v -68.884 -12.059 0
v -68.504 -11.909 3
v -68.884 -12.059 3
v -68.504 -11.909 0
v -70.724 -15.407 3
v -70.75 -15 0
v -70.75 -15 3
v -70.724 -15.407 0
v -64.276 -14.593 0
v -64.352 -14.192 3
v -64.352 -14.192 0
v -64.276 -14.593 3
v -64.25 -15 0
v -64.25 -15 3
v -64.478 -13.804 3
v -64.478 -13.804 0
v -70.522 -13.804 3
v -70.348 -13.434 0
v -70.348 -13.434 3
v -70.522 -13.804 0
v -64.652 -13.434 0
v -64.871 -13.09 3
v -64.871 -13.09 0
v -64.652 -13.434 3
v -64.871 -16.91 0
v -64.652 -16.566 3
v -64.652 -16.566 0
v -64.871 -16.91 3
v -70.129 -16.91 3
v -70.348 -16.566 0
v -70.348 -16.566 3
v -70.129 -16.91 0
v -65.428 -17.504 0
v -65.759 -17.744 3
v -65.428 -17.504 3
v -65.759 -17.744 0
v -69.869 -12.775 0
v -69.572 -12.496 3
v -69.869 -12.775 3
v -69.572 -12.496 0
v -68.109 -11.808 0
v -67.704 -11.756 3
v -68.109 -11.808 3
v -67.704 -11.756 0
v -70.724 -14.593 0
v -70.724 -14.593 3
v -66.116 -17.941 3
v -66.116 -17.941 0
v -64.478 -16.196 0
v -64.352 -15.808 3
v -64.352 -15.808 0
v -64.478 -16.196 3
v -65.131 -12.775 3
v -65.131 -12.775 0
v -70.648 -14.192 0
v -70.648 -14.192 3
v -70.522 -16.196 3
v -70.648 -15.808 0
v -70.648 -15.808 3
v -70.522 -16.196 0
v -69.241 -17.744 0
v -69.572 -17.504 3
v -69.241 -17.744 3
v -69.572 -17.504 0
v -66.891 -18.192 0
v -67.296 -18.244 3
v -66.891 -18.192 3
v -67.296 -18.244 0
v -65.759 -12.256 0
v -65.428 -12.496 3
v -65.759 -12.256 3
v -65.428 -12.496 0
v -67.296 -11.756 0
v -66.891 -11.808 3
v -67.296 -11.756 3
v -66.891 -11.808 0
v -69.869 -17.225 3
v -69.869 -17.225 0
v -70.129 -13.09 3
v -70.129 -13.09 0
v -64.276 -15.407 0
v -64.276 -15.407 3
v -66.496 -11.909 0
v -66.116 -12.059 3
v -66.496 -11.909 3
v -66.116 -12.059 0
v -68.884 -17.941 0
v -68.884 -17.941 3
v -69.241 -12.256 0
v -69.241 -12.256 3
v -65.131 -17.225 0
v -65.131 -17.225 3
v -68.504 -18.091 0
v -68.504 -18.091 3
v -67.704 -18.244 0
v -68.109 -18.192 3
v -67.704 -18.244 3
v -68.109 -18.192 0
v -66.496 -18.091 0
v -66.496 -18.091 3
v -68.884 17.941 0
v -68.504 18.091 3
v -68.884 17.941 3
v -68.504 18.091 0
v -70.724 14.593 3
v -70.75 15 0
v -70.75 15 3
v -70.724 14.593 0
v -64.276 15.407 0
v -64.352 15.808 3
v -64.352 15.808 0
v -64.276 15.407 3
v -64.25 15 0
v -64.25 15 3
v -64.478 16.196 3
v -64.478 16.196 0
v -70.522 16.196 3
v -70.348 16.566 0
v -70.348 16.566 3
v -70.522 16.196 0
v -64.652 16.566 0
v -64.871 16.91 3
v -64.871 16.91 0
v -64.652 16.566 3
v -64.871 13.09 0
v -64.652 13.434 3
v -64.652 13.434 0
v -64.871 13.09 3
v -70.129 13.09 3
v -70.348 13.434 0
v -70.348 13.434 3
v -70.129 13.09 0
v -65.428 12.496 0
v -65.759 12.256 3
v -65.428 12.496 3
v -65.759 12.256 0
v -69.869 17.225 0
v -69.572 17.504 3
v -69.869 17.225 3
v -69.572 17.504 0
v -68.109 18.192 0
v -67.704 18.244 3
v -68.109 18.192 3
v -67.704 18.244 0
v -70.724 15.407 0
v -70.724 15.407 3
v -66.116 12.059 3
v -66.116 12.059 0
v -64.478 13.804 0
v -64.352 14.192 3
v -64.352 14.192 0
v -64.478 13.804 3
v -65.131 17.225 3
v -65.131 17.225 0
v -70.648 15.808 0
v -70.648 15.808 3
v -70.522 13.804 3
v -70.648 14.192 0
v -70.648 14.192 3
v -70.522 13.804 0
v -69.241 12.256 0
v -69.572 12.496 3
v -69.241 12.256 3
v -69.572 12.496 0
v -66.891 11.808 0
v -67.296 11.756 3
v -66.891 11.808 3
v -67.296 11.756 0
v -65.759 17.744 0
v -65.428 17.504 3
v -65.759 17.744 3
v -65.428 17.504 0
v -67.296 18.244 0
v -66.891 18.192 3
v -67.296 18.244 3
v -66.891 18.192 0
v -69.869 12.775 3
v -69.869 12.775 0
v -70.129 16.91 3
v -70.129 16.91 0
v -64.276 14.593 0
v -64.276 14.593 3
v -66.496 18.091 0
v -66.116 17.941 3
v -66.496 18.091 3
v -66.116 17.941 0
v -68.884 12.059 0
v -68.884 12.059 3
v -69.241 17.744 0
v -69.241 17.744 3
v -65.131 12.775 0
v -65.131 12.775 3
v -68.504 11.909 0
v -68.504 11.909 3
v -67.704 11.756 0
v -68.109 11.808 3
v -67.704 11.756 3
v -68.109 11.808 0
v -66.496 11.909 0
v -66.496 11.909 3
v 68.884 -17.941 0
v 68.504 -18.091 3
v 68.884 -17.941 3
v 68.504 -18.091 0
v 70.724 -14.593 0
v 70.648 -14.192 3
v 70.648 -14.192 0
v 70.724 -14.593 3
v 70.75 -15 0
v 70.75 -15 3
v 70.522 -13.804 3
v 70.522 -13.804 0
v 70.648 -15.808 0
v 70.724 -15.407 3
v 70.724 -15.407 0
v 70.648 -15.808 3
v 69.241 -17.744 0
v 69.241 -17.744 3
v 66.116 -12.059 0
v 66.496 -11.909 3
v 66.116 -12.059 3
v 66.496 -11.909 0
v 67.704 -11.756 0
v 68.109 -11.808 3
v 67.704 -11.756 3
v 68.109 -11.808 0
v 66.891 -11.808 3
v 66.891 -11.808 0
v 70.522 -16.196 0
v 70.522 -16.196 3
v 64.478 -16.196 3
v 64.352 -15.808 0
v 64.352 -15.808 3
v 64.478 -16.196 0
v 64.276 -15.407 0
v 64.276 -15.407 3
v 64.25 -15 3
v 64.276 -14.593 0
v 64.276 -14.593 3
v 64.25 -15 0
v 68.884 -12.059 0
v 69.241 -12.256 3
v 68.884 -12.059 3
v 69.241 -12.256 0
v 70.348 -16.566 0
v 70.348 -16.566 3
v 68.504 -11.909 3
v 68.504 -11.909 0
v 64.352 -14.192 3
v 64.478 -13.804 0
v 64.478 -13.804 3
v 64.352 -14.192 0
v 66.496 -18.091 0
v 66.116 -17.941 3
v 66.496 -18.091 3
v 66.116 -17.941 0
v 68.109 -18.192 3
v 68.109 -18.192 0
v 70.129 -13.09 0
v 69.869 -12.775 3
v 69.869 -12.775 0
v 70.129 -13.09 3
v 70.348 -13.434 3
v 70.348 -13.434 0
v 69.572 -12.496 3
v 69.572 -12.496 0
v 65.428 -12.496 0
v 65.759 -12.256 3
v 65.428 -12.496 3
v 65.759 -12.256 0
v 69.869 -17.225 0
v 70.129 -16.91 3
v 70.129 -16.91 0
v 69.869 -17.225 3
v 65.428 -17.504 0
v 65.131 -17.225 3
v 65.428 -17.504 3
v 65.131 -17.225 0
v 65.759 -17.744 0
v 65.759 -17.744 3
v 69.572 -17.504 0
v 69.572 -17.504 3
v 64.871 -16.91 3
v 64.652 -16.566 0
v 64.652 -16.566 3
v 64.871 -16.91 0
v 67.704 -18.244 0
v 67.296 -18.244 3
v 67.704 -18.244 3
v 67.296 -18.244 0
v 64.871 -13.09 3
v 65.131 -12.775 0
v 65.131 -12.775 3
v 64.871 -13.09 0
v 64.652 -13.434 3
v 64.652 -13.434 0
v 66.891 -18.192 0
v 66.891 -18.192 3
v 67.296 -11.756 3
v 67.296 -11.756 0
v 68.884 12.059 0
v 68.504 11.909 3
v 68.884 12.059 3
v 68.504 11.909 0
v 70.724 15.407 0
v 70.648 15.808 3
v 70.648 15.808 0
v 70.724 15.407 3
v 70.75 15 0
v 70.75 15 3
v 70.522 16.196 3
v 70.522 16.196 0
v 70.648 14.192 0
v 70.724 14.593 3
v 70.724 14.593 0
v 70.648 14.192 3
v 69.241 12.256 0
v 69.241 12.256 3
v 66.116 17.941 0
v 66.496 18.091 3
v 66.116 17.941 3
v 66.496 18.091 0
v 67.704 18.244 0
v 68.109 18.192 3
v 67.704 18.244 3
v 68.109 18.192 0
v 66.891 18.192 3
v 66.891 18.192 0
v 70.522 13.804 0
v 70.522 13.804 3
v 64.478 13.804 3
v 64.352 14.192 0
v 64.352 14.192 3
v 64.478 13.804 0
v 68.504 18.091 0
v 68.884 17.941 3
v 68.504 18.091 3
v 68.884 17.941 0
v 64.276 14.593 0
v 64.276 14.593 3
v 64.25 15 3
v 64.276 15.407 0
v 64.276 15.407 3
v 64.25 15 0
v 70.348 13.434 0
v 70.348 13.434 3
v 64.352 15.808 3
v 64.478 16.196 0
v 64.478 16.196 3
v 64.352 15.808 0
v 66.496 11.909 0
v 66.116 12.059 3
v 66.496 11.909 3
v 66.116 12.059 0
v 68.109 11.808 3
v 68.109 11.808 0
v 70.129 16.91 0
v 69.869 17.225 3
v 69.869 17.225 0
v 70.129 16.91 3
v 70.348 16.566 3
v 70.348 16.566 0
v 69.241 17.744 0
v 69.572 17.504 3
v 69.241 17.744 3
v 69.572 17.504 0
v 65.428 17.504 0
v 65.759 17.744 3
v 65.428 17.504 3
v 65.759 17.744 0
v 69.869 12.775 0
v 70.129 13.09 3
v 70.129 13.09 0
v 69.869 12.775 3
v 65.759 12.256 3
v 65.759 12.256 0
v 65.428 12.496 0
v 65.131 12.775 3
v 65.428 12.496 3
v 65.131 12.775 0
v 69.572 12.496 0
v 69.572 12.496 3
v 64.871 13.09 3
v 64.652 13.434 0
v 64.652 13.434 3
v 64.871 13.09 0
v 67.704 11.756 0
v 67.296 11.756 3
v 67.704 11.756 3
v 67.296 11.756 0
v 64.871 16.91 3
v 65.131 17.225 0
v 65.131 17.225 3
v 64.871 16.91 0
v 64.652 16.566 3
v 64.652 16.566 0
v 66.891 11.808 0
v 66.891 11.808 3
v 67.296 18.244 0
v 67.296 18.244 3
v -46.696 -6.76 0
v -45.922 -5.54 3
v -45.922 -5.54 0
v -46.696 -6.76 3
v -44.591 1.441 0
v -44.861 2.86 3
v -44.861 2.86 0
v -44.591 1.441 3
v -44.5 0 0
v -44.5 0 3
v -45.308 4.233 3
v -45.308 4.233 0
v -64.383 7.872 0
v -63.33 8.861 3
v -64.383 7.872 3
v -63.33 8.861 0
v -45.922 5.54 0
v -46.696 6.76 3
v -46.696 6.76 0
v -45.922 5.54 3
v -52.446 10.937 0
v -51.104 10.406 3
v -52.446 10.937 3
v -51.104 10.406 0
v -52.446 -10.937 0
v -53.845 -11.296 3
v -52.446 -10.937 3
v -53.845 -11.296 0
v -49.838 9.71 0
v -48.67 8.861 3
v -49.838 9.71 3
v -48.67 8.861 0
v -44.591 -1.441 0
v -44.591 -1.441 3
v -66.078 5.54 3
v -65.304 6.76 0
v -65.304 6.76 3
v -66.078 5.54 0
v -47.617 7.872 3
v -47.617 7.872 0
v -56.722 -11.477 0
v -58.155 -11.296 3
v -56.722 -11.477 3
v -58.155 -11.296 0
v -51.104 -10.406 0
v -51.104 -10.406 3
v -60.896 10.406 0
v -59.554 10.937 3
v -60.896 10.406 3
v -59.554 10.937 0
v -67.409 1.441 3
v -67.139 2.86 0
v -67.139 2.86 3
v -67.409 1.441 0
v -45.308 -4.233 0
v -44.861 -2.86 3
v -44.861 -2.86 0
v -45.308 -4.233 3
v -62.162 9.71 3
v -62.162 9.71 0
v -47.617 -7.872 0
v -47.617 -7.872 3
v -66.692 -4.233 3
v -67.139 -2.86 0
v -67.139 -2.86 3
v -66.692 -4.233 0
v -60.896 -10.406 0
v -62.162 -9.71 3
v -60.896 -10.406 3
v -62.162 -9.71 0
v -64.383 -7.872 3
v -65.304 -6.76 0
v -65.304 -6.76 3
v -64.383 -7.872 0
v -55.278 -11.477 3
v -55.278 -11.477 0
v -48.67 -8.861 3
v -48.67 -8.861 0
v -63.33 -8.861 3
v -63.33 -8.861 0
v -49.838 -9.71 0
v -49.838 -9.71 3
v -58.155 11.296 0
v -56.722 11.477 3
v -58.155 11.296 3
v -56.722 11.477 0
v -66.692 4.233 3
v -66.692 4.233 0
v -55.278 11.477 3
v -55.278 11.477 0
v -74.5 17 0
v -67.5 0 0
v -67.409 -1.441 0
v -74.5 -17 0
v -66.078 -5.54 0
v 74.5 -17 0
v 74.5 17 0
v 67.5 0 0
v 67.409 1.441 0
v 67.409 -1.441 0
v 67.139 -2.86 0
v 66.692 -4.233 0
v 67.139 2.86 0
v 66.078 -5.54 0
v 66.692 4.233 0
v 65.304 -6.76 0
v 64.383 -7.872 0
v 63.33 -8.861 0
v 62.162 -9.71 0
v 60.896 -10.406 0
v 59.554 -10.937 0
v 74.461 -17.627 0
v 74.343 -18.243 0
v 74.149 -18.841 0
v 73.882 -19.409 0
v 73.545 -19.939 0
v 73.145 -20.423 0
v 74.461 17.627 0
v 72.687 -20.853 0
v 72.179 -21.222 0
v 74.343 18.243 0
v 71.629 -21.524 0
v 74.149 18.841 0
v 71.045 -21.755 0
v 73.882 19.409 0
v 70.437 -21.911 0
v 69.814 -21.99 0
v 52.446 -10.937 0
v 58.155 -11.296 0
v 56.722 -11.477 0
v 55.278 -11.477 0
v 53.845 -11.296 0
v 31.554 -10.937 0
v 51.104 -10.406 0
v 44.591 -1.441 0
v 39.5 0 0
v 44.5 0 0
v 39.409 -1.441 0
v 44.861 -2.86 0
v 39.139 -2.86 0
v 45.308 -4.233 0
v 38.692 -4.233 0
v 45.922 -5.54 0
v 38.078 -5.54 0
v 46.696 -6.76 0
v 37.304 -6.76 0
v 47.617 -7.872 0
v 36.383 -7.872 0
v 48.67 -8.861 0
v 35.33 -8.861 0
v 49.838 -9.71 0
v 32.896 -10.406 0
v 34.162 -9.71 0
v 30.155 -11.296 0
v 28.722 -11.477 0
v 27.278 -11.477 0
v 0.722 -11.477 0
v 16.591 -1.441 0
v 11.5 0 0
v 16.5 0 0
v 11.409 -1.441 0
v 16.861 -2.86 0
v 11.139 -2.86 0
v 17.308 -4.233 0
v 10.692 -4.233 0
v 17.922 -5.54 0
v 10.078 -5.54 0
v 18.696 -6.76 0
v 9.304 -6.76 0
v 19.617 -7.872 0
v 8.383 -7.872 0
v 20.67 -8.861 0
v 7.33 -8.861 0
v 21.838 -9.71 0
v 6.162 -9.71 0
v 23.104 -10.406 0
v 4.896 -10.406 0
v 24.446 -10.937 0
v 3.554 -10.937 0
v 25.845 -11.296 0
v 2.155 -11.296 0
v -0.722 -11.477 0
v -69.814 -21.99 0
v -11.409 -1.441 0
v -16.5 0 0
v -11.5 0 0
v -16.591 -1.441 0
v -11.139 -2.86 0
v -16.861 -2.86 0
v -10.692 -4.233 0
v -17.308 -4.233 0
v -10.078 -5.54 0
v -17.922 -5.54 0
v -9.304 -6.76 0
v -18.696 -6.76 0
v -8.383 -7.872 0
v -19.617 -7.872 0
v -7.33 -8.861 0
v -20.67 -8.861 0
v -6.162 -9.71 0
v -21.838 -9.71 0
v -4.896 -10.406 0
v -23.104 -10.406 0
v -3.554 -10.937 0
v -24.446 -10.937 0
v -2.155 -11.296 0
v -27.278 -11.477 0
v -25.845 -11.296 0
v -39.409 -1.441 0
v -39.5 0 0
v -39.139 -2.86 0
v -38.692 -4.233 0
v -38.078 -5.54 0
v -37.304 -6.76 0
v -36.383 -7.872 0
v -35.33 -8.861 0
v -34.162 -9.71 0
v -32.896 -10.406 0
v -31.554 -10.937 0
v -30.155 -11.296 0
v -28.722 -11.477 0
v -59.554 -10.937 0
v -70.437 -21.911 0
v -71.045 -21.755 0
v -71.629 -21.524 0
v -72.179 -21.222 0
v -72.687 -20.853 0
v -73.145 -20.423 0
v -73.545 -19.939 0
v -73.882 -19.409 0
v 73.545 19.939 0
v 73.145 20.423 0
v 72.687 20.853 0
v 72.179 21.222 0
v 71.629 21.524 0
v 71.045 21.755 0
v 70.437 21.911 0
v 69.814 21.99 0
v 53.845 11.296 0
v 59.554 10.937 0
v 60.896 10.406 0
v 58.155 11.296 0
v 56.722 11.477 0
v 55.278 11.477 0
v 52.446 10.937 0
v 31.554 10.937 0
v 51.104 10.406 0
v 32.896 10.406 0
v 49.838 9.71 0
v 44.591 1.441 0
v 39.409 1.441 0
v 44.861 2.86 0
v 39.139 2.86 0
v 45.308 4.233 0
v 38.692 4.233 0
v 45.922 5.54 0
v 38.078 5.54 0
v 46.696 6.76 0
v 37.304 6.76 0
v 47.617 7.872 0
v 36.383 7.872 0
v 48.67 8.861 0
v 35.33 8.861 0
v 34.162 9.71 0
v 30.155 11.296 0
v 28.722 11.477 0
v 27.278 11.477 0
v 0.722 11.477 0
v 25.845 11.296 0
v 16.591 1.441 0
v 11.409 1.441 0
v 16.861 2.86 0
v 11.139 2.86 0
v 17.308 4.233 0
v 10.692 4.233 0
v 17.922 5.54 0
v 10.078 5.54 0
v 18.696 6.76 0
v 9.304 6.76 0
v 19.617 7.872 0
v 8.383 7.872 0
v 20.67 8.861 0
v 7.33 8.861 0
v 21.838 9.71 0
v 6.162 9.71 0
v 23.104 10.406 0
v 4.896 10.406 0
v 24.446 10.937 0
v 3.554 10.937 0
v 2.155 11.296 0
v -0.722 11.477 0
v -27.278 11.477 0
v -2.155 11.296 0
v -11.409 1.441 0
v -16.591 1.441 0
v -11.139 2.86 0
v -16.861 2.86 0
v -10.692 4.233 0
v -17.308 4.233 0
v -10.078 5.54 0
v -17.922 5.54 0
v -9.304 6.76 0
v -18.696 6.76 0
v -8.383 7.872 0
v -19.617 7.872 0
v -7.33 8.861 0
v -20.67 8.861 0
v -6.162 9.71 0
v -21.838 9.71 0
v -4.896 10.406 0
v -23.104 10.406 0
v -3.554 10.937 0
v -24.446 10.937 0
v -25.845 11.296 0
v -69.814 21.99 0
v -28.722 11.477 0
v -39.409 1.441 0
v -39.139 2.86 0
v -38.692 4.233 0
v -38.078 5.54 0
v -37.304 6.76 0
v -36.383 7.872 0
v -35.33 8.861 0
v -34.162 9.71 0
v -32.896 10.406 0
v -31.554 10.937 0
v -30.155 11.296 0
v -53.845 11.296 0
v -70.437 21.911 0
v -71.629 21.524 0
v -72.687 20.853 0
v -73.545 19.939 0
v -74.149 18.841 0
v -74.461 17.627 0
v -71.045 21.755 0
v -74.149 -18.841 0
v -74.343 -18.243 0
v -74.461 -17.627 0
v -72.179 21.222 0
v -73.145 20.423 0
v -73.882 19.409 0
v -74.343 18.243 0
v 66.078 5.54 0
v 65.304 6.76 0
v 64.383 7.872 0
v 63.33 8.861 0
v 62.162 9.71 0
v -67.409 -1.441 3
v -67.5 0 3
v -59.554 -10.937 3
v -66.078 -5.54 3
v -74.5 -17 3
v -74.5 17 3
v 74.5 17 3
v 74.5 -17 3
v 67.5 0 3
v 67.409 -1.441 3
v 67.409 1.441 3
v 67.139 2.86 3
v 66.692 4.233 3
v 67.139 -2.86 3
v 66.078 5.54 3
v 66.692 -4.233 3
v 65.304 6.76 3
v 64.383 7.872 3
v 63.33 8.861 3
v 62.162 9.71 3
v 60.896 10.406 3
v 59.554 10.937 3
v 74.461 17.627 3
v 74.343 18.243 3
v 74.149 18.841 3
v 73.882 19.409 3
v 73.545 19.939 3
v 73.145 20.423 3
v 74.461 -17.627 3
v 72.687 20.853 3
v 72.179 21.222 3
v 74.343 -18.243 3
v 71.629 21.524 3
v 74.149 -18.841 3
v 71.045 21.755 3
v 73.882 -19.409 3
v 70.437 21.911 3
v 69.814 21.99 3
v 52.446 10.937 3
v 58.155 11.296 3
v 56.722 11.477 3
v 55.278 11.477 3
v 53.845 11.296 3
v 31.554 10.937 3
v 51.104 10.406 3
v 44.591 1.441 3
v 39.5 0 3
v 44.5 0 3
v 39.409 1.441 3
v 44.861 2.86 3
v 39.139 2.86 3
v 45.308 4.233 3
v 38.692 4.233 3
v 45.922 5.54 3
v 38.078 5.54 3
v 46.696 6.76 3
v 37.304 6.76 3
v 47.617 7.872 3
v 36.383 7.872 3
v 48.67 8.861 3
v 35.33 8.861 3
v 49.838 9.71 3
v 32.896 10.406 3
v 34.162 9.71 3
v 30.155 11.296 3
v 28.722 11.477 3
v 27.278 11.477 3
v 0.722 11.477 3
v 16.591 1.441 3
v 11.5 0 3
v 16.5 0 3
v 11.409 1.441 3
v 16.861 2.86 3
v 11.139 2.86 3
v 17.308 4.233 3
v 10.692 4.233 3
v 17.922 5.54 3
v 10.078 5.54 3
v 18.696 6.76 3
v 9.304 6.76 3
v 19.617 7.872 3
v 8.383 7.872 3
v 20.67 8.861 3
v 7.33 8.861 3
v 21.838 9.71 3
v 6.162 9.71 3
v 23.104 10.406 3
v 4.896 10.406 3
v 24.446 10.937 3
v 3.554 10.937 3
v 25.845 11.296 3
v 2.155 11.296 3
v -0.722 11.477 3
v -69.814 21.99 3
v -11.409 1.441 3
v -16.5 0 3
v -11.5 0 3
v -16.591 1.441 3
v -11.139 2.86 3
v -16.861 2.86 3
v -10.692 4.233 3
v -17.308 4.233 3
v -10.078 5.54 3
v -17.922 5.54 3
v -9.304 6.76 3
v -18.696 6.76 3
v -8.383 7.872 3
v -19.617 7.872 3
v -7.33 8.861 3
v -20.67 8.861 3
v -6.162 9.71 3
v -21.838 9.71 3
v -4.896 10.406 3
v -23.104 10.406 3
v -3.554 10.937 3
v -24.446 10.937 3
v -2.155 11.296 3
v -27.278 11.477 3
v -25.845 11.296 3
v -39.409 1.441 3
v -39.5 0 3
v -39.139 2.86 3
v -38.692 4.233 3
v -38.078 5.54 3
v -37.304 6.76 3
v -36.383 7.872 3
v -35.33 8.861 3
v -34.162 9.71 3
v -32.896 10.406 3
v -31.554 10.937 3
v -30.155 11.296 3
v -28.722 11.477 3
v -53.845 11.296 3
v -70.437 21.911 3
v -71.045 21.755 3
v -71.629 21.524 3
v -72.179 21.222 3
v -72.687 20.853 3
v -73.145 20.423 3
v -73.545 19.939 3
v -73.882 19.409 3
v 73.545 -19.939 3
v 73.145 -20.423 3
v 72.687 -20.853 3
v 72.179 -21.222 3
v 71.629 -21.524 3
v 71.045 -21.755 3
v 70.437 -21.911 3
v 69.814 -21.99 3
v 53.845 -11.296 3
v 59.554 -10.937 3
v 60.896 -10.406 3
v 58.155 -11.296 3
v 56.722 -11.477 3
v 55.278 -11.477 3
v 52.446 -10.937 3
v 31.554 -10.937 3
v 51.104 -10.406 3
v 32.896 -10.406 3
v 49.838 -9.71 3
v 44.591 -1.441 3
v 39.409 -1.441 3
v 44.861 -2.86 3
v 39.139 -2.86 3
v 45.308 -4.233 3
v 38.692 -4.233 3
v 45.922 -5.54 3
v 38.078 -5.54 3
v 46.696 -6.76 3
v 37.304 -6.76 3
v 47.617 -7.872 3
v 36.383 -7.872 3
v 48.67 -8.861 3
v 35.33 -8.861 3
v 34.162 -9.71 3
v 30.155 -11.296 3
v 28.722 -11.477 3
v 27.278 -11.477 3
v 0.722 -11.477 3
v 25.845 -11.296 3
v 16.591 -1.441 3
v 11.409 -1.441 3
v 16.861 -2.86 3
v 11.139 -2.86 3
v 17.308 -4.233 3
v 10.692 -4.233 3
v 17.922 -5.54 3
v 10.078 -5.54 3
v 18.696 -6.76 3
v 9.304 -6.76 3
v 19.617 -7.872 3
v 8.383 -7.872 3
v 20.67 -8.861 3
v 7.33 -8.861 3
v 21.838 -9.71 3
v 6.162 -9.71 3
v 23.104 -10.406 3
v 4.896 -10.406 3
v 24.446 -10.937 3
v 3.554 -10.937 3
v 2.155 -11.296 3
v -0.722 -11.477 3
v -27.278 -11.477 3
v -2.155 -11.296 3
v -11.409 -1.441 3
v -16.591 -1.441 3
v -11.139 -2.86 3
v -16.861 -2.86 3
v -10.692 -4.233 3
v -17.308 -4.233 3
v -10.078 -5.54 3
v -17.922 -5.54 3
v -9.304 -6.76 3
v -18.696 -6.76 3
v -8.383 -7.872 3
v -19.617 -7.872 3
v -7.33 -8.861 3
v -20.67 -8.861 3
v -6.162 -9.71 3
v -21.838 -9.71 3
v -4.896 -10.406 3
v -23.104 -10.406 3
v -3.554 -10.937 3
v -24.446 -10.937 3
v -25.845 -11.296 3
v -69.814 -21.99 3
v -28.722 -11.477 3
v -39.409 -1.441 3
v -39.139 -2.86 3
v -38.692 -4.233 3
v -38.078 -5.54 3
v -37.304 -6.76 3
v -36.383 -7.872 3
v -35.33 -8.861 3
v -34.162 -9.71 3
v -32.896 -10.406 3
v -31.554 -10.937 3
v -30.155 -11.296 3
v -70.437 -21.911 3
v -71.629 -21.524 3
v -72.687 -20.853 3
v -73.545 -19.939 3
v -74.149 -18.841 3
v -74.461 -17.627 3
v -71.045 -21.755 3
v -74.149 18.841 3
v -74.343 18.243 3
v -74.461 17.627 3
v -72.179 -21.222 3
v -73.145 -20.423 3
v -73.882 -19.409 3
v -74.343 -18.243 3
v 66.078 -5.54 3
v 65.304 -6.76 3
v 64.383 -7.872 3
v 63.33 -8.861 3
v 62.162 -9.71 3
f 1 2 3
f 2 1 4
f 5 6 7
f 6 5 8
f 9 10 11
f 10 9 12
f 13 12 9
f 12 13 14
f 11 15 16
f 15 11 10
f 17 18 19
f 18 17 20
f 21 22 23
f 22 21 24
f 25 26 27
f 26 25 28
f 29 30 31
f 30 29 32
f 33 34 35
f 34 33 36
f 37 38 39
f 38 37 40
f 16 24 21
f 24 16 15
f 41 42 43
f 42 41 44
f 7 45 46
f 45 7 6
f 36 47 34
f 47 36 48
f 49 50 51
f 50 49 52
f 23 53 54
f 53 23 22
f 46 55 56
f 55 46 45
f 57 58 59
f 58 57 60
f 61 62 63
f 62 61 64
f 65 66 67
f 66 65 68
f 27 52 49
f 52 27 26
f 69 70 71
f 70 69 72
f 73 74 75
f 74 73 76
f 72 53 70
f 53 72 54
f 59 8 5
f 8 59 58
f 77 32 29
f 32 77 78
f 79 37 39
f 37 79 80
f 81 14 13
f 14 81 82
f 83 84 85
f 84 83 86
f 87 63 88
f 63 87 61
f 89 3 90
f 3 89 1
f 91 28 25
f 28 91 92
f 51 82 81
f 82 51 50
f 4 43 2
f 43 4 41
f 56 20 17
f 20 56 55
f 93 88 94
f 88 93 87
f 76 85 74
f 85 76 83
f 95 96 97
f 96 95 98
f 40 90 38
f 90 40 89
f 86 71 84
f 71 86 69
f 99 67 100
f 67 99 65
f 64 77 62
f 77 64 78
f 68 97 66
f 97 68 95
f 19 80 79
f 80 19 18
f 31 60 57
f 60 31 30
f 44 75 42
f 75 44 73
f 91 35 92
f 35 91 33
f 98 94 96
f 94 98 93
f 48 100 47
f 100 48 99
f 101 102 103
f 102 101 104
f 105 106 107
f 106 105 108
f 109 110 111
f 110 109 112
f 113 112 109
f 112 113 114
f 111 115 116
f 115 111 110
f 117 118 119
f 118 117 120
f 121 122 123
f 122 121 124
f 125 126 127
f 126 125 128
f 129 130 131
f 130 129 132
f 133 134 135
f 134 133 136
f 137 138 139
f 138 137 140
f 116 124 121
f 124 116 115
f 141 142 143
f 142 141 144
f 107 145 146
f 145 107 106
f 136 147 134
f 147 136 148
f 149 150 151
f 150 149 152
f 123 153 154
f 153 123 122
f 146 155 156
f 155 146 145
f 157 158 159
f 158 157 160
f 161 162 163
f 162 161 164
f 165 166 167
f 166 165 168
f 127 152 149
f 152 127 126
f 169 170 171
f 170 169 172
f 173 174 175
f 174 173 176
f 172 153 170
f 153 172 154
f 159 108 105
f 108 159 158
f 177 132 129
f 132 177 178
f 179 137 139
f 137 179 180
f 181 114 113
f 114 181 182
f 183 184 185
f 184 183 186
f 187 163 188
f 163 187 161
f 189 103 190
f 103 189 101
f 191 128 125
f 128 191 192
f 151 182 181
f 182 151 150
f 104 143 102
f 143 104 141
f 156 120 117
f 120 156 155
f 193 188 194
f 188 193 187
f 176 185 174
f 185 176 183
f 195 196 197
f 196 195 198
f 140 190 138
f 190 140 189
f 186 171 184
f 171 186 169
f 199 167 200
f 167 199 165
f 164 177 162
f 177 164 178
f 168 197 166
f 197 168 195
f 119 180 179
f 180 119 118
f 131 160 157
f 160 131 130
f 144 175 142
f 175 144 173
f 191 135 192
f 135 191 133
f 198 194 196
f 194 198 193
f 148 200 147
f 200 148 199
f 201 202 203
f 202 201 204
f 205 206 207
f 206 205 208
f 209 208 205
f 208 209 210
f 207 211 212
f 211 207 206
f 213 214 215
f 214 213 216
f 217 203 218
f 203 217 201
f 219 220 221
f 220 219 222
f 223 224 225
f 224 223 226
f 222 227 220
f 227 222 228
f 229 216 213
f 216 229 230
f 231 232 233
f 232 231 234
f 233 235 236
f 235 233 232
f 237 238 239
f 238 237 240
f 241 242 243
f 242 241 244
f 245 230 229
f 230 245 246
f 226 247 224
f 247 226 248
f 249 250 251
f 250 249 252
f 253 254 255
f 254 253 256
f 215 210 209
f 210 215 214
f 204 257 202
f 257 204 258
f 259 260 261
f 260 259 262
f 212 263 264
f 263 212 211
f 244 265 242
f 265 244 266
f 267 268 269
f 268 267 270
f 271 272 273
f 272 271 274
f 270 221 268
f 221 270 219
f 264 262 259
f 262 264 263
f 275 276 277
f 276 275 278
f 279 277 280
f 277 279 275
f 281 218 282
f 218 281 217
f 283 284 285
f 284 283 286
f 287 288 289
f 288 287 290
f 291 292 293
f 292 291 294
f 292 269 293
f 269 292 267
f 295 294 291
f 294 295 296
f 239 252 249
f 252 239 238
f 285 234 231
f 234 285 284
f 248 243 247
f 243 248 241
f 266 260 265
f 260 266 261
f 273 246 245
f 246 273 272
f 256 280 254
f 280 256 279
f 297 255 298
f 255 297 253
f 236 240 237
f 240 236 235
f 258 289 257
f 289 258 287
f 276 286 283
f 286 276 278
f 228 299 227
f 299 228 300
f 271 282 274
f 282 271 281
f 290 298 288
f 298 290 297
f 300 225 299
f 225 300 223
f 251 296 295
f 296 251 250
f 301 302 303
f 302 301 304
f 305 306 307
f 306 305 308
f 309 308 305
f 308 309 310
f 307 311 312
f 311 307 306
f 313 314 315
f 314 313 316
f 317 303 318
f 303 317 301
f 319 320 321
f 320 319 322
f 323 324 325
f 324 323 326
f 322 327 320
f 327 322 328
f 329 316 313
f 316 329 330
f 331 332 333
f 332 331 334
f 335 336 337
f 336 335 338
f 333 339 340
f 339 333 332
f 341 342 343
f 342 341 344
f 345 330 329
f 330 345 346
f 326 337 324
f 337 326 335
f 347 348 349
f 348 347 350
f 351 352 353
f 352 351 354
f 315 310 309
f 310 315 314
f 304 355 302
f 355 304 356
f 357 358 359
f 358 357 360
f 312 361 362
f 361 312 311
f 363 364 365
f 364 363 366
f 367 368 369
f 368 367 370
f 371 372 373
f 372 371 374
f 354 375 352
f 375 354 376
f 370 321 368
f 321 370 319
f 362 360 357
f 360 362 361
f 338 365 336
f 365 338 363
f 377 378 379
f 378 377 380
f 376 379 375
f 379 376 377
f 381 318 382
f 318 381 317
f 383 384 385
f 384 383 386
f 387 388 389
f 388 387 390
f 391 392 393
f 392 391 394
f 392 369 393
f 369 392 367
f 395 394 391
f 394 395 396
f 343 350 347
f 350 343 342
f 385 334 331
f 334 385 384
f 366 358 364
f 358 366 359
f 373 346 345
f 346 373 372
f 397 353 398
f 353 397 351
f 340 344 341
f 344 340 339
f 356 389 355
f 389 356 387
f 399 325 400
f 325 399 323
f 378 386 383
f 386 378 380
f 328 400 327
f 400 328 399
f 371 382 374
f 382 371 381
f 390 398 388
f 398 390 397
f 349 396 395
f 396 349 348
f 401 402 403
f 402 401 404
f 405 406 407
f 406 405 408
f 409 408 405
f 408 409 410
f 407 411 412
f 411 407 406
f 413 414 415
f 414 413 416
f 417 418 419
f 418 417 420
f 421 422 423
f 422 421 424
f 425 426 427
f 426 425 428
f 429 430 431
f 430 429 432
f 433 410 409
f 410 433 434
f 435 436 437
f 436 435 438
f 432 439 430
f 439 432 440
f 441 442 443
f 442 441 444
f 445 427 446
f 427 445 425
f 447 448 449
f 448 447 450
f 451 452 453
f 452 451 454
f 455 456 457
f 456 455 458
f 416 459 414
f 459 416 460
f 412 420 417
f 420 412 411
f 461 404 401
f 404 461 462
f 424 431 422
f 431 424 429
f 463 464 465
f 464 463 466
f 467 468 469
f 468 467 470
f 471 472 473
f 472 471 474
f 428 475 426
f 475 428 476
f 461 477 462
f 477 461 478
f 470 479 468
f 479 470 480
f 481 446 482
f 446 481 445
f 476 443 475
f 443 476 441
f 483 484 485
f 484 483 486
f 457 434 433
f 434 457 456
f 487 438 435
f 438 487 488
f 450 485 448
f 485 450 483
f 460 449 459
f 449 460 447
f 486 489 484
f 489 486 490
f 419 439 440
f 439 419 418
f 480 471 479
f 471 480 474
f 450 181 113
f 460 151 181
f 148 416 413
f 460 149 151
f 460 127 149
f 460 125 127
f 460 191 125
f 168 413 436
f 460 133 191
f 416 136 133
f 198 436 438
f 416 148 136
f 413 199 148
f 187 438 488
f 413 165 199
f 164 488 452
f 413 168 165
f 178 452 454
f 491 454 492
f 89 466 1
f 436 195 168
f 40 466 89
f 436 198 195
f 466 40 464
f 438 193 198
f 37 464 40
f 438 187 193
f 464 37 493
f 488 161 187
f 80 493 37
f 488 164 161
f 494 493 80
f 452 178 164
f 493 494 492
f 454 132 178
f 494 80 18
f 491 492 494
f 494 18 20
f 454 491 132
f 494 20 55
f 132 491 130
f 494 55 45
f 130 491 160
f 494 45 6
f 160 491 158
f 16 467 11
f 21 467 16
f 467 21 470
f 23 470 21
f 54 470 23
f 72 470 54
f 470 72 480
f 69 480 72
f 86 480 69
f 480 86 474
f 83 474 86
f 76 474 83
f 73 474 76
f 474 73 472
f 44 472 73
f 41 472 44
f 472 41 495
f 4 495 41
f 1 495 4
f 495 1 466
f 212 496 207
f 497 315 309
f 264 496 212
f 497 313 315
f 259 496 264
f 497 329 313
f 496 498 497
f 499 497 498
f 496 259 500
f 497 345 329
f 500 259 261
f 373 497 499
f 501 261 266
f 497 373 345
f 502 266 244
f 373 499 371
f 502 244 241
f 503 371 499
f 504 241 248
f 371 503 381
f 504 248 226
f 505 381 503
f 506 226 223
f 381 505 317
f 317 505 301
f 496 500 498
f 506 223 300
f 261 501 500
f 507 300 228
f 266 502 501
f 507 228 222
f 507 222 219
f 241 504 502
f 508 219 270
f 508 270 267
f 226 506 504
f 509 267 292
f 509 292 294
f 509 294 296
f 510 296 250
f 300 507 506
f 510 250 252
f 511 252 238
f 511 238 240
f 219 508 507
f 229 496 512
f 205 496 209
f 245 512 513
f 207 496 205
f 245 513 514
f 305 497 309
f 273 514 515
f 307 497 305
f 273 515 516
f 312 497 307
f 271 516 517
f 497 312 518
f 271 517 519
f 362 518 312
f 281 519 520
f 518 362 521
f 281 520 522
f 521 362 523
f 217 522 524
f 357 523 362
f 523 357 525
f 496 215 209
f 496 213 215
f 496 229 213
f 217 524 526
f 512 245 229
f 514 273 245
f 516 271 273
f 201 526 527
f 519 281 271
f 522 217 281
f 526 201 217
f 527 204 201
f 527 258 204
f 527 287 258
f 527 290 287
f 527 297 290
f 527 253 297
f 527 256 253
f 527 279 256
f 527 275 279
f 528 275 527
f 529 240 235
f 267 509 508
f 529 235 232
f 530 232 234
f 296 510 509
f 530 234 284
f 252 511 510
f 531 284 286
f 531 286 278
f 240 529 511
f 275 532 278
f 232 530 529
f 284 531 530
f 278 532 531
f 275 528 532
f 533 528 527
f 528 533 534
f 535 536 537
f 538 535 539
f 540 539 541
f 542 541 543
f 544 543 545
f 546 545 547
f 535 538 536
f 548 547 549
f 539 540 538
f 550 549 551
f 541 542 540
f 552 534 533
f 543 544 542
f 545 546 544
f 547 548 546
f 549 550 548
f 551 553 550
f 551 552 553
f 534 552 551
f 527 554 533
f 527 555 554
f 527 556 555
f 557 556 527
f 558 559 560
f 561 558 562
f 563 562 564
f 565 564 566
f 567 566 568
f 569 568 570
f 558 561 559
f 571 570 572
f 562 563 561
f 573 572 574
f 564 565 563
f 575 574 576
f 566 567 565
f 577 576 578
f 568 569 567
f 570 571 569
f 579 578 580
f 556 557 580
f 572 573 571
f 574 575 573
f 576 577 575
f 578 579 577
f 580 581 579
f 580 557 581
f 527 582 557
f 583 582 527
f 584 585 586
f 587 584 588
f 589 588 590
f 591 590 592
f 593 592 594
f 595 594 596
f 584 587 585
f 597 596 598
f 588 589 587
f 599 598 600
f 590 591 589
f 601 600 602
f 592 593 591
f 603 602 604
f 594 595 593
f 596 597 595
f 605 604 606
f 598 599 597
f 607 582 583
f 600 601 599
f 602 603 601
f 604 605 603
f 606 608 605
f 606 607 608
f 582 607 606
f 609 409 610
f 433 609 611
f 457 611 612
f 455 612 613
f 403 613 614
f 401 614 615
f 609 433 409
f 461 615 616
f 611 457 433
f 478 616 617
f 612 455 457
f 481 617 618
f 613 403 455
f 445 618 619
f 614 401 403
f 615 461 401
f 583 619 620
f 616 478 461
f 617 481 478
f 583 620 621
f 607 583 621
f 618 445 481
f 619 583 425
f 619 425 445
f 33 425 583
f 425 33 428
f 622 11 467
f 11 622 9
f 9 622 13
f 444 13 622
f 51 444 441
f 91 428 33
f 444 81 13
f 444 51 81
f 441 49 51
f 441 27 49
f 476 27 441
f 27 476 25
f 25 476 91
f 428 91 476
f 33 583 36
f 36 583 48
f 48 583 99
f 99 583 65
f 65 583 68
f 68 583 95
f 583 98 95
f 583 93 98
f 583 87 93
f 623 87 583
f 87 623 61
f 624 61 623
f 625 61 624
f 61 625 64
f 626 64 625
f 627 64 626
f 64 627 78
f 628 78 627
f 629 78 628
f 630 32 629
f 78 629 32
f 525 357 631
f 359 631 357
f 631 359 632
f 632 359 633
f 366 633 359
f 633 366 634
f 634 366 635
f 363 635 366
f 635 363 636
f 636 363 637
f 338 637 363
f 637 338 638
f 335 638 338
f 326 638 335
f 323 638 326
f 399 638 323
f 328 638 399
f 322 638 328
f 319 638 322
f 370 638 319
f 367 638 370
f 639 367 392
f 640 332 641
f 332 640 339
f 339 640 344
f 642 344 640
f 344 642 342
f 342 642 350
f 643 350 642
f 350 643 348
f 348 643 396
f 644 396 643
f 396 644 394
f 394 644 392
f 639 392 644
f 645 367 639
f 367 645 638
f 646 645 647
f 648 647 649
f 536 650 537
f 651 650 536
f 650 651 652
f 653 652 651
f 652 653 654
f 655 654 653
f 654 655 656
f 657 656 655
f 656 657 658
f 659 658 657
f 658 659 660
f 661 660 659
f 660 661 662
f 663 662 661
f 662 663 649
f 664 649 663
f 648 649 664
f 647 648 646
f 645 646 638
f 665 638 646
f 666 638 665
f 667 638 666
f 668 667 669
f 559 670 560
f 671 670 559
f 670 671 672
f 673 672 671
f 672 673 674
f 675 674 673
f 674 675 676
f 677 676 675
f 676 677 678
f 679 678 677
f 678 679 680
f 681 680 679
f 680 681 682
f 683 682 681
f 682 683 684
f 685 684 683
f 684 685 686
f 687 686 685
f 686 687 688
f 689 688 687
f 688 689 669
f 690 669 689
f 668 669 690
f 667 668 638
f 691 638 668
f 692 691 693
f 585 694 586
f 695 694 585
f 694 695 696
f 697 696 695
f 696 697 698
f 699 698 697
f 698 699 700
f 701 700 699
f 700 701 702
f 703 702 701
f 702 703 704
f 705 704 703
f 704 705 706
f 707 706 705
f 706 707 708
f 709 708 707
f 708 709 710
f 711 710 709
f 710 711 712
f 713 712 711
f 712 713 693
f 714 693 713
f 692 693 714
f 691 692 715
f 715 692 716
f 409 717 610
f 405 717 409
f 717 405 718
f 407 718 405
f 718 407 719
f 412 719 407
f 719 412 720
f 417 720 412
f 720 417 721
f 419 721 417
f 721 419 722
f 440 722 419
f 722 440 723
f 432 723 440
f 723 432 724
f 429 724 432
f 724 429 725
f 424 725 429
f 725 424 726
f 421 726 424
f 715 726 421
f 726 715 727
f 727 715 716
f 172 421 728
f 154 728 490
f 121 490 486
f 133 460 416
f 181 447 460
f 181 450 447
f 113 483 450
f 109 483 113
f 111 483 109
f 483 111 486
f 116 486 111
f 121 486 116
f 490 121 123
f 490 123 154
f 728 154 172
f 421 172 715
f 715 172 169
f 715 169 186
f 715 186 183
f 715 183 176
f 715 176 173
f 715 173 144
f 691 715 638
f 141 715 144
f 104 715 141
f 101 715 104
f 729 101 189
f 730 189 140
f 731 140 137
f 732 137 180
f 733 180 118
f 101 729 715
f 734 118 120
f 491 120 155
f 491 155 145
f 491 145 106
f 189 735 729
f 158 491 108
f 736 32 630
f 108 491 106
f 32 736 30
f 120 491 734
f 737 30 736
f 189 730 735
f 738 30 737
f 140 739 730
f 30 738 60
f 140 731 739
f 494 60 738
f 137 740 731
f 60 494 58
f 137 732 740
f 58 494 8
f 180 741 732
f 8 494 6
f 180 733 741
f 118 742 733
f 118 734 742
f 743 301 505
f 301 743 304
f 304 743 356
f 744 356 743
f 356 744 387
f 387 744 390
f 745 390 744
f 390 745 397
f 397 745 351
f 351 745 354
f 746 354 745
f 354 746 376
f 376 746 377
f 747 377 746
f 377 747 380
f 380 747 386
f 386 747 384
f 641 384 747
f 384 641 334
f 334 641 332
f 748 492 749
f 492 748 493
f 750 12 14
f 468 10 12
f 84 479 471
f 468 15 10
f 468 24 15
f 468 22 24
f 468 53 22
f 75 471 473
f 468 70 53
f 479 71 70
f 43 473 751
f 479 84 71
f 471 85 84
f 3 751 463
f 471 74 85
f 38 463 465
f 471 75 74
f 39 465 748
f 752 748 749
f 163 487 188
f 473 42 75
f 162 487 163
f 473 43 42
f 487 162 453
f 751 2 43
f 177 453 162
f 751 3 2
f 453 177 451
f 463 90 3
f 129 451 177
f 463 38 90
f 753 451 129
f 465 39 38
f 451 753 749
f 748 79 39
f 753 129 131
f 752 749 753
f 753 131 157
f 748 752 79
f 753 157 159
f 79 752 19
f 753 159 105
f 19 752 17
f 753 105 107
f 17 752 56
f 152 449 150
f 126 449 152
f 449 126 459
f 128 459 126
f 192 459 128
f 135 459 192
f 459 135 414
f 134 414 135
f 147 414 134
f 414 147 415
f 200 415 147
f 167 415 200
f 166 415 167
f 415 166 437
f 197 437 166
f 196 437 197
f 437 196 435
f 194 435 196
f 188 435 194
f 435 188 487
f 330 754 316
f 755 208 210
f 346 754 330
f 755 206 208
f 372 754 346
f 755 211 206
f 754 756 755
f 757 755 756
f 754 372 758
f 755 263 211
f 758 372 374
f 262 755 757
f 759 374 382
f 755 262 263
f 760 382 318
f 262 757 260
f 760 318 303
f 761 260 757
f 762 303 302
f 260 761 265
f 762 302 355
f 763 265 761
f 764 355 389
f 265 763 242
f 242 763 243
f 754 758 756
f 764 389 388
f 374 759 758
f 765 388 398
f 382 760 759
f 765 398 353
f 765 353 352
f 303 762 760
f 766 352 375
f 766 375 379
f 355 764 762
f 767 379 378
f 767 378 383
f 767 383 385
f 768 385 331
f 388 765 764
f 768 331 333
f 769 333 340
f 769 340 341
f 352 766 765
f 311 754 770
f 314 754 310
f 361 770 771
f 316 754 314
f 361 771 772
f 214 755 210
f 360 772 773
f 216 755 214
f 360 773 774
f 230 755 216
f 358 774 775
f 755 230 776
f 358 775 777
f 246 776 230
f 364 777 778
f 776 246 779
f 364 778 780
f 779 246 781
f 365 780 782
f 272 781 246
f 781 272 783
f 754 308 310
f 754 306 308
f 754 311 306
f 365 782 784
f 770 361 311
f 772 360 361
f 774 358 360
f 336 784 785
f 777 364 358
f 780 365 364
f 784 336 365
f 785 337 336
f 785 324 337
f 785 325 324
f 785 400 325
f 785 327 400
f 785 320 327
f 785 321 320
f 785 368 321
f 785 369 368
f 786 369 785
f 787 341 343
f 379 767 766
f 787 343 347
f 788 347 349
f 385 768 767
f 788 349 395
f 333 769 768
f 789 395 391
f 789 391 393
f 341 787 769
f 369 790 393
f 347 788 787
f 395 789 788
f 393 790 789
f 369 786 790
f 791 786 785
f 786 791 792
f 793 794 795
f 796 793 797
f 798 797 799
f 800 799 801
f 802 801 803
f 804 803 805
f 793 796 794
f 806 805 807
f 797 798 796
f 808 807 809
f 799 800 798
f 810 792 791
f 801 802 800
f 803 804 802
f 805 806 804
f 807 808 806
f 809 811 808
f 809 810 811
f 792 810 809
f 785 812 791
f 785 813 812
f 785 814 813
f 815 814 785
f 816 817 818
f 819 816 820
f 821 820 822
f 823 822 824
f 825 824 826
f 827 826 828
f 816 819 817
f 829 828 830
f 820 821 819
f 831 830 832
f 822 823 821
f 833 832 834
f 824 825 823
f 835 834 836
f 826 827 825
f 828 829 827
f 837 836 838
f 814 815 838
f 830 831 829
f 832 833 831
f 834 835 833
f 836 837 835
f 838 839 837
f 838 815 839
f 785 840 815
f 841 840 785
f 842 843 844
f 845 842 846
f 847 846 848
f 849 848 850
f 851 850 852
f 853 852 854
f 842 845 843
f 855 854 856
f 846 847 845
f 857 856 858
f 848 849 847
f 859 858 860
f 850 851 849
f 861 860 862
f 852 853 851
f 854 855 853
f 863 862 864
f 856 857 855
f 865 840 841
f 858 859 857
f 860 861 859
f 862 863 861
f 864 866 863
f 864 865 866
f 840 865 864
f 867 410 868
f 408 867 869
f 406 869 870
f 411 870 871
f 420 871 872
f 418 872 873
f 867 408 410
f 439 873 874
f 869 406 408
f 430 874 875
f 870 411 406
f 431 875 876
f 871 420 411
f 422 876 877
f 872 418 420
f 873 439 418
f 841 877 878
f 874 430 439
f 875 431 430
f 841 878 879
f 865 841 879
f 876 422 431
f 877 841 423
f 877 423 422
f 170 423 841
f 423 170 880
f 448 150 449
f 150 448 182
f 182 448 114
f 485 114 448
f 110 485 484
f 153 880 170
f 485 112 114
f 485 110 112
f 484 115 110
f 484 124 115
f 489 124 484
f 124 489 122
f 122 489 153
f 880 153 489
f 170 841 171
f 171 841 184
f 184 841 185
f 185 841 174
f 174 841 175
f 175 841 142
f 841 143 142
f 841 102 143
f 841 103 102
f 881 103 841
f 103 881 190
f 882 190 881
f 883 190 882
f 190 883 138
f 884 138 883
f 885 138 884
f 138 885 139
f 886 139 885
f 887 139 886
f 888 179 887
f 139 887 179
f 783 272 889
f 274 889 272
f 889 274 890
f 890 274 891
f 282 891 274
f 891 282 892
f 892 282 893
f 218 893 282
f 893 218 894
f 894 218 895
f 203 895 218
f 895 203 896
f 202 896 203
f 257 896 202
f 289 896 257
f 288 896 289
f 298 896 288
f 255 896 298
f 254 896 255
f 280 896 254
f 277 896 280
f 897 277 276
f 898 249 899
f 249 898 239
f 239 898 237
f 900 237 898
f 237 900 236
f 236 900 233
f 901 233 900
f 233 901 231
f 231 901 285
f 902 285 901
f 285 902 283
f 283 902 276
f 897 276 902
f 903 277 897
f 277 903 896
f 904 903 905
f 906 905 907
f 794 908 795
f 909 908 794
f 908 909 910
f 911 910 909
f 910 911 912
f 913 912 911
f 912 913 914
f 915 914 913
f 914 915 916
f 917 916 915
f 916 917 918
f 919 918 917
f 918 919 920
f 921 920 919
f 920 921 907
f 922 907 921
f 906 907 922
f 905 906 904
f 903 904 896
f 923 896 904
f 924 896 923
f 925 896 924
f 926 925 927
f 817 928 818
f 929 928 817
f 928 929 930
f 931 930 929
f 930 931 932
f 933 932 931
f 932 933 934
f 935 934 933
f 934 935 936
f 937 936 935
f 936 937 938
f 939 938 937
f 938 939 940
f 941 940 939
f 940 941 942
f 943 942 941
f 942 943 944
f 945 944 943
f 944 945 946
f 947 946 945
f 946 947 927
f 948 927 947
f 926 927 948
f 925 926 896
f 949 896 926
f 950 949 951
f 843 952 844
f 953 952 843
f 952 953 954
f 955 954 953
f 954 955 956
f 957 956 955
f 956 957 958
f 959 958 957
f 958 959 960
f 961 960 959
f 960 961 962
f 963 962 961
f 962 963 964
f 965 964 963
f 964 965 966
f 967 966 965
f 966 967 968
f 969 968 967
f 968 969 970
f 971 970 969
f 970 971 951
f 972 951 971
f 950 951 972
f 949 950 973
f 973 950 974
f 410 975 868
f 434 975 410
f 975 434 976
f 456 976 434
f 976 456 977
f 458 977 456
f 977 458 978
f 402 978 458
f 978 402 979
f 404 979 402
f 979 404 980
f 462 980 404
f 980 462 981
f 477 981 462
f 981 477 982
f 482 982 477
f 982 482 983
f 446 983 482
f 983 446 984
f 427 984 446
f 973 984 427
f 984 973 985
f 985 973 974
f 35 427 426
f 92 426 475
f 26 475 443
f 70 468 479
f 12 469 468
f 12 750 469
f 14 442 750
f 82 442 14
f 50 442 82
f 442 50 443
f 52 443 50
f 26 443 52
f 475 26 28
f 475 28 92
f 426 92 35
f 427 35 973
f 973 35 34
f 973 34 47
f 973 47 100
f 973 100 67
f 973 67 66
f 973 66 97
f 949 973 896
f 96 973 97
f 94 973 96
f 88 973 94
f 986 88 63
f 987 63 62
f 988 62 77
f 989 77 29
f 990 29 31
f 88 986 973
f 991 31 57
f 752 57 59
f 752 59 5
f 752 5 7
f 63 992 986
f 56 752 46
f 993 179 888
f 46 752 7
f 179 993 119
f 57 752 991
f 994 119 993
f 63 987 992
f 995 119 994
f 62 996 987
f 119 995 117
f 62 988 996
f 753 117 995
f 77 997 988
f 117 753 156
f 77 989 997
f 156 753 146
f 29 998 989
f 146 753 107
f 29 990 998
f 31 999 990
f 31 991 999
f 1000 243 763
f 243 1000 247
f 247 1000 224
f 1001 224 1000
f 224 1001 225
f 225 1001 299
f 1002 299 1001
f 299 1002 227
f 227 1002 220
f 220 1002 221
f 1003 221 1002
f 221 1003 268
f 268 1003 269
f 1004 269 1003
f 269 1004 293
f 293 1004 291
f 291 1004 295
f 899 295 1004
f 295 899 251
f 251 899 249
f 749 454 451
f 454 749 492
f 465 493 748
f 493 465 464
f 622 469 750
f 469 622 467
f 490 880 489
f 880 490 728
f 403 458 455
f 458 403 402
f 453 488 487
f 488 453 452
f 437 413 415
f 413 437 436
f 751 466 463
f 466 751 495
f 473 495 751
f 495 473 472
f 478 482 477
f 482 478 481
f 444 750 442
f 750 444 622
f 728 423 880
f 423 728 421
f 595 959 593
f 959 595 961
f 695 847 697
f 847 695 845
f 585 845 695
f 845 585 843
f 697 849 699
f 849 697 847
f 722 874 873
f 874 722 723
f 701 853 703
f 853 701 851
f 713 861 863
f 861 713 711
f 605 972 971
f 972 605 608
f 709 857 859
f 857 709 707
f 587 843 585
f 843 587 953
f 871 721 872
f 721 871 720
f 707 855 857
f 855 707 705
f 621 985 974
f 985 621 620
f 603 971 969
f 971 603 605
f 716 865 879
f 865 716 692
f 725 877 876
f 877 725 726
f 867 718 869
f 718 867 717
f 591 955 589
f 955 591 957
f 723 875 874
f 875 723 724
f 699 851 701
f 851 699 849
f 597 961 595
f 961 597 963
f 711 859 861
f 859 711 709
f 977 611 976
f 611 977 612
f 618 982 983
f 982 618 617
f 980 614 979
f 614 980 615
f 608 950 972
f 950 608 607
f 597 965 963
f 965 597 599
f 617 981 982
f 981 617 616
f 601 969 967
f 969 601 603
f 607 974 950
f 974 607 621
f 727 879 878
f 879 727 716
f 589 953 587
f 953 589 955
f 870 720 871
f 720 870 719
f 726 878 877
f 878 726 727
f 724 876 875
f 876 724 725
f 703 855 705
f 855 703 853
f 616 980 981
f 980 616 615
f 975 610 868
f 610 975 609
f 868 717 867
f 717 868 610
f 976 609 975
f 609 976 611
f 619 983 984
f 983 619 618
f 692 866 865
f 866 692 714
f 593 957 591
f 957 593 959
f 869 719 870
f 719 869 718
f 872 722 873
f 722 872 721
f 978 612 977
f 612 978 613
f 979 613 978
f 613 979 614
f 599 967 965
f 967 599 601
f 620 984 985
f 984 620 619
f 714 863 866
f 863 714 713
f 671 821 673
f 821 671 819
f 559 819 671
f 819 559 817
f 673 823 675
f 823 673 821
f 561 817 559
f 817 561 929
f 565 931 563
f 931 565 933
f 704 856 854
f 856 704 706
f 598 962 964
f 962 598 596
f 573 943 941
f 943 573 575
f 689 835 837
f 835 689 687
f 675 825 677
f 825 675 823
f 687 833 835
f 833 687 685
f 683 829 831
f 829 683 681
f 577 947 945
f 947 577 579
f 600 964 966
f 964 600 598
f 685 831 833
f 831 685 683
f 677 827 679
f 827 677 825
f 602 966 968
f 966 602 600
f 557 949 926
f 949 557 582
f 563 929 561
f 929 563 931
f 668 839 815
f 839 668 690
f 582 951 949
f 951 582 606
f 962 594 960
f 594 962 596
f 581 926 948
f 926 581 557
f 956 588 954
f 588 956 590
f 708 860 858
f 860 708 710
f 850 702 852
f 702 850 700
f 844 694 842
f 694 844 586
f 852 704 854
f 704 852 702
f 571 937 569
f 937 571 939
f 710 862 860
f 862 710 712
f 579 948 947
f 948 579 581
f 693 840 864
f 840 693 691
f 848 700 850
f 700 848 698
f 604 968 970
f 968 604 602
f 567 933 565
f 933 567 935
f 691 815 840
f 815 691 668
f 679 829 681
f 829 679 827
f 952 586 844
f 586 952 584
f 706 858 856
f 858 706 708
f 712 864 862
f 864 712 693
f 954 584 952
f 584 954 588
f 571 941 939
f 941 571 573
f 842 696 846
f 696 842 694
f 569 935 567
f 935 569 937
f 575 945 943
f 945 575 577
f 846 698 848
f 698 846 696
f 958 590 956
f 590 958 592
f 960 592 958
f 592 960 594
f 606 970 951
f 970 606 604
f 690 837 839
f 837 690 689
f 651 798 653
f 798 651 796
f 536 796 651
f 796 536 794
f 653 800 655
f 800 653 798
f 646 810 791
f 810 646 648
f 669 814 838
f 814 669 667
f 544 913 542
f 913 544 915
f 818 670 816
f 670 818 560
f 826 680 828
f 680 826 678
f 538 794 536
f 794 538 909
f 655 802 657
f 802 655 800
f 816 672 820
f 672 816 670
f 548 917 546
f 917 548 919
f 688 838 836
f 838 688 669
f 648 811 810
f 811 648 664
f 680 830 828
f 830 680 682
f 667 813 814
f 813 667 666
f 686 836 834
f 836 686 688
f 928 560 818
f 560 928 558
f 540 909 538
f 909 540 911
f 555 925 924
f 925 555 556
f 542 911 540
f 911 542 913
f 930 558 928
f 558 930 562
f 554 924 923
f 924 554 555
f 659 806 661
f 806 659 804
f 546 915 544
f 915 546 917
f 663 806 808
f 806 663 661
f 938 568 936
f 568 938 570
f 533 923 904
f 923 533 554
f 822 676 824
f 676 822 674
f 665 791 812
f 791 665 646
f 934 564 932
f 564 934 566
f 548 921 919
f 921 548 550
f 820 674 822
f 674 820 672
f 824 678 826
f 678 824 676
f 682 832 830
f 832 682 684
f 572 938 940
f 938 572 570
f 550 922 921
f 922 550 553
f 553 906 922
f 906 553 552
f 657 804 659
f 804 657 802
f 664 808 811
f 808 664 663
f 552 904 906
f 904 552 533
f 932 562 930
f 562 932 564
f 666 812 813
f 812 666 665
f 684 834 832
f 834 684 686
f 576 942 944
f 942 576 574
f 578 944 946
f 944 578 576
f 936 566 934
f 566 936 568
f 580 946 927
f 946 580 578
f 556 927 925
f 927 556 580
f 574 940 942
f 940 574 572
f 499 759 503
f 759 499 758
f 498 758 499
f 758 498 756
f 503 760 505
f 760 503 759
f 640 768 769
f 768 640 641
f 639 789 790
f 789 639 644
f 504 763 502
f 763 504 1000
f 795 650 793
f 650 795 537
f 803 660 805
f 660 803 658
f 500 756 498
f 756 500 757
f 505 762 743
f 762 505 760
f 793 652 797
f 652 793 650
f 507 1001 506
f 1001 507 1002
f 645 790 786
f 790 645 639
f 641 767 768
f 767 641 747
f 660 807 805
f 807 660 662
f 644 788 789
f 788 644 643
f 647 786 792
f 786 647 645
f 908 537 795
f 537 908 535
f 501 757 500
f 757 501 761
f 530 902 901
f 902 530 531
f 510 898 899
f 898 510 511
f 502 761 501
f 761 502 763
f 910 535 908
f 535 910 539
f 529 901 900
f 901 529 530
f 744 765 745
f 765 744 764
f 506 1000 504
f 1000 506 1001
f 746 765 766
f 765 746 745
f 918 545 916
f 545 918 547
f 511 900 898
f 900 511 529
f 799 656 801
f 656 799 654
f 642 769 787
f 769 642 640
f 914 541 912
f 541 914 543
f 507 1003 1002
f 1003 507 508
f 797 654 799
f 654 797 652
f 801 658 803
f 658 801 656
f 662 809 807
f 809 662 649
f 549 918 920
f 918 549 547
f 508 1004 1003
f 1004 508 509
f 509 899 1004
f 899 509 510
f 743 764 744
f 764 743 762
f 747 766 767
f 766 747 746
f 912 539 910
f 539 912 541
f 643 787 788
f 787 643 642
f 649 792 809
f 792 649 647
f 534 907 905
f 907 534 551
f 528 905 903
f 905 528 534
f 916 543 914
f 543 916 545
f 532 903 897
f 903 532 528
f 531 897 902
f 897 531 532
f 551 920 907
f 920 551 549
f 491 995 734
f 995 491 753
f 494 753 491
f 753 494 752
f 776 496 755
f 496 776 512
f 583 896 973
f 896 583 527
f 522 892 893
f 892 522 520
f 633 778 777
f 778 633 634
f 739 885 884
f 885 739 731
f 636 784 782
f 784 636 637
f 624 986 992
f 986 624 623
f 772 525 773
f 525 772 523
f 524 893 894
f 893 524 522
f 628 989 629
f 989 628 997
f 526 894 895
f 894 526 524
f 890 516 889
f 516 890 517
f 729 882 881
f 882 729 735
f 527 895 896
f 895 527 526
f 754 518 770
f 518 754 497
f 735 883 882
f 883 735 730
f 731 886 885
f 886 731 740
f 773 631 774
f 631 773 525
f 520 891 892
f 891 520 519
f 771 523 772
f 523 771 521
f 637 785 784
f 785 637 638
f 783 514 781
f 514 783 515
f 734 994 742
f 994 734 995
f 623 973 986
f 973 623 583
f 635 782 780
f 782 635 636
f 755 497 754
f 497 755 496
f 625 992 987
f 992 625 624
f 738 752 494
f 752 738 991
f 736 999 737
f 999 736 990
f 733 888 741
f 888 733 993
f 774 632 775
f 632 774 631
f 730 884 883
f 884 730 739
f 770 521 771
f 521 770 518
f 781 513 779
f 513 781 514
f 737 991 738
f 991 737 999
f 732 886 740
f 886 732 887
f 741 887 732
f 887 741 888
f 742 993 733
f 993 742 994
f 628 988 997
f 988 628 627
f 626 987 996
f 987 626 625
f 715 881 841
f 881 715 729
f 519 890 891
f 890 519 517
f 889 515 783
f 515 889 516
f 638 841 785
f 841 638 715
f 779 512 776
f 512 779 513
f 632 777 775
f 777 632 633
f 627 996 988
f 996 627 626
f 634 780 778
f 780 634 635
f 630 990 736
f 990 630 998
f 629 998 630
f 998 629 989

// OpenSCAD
$fn = 50;


difference() {
	union() {
		hull() {
			translate(v = [-69.5000000000, 17.0000000000, 0]) {
				cylinder(h = 3, r = 5);
			}
			translate(v = [69.5000000000, 17.0000000000, 0]) {
				cylinder(h = 3, r = 5);
			}
			translate(v = [-69.5000000000, -17.0000000000, 0]) {
				cylinder(h = 3, r = 5);
			}
			translate(v = [69.5000000000, -17.0000000000, 0]) {
				cylinder(h = 3, r = 5);
			}
		}
	}
	union() {
		#translate(v = [-67.5000000000, -15.0000000000, -100.0000000000]) {
			cylinder(h = 200, r = 3.2500000000);
		}
		#translate(v = [-67.5000000000, 15.0000000000, -100.0000000000]) {
			cylinder(h = 200, r = 3.2500000000);
		}
		#translate(v = [67.5000000000, -15.0000000000, -100.0000000000]) {
			cylinder(h = 200, r = 3.2500000000);
		}
		#translate(v = [67.5000000000, 15.0000000000, -100.0000000000]) {
			cylinder(h = 200, r = 3.2500000000);
		}
		#translate(v = [-56.0000000000, 0, 0]) {
			cylinder(h = 3, r = 11.5000000000);
		}
		#translate(v = [-28.0000000000, 0, 0]) {
			cylinder(h = 3, r = 11.5000000000);
		}
		#cylinder(h = 3, r = 11.5000000000);
		#translate(v = [28.0000000000, 0, 0]) {
			cylinder(h = 3, r = 11.5000000000);
		}
		#translate(v = [56.0000000000, 0, 0]) {
			cylinder(h = 3, r = 11.5000000000);
		}
	}
}
